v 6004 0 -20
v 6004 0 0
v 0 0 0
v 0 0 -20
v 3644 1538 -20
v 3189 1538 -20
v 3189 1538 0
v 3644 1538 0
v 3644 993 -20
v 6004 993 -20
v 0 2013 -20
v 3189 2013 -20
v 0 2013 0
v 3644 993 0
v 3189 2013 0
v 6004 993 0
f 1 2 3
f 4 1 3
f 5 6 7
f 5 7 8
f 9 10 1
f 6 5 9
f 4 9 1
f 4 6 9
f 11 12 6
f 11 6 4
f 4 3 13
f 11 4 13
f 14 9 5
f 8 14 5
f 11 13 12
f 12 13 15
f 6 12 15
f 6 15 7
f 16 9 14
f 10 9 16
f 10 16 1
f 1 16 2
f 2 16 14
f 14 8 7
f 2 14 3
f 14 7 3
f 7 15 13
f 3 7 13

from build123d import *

# Parameters (mm, degrees)
TABAN_FLAN_1_DEPTH         = 20
KES_EKSTR_ZYON1_DEPTH      = 6333.502270035
KES_EKSTR_ZYON1_DEPTH_BACK = 6333.502270035
IZIM2_W                    = 2360
IZIM2_H                    = 545
IZIM2_W_2                  = 379
IZIM2_H_2                  = 206


# Sheet-metal steps are written as plain solids
with BuildPart() as part:
    # Çizim1 → Taban-Flanş1 (new body)
    with BuildSketch(Plane.XY):
        Polygon((0, 0), (0, 2013), (3568, 2013), (3568, 1807), (6004, 1807), (6004, 0), align=None)
    extrude(amount=-TABAN_FLAN_1_DEPTH)

    # Çizim2 → Kes-Ekstrüzyon1 (cut, two sides: drawn at the far end of the back side and taken through both)
    with BuildSketch(Plane.XY.offset(-KES_EKSTR_ZYON1_DEPTH_BACK)):
        with Locations((4824, 1265.5)):
            Rectangle(IZIM2_W, IZIM2_H)
        Polygon((6004, 1538), (6004, 1807), (3568, 1807), (3189, 1807), (3189, 1538), (3644, 1538), align=None)
        with Locations((3378.5, 1910)):
            Rectangle(IZIM2_W_2, IZIM2_H_2)
    extrude(amount=KES_EKSTR_ZYON1_DEPTH + KES_EKSTR_ZYON1_DEPTH_BACK, mode=Mode.SUBTRACT)


solid = part.part
